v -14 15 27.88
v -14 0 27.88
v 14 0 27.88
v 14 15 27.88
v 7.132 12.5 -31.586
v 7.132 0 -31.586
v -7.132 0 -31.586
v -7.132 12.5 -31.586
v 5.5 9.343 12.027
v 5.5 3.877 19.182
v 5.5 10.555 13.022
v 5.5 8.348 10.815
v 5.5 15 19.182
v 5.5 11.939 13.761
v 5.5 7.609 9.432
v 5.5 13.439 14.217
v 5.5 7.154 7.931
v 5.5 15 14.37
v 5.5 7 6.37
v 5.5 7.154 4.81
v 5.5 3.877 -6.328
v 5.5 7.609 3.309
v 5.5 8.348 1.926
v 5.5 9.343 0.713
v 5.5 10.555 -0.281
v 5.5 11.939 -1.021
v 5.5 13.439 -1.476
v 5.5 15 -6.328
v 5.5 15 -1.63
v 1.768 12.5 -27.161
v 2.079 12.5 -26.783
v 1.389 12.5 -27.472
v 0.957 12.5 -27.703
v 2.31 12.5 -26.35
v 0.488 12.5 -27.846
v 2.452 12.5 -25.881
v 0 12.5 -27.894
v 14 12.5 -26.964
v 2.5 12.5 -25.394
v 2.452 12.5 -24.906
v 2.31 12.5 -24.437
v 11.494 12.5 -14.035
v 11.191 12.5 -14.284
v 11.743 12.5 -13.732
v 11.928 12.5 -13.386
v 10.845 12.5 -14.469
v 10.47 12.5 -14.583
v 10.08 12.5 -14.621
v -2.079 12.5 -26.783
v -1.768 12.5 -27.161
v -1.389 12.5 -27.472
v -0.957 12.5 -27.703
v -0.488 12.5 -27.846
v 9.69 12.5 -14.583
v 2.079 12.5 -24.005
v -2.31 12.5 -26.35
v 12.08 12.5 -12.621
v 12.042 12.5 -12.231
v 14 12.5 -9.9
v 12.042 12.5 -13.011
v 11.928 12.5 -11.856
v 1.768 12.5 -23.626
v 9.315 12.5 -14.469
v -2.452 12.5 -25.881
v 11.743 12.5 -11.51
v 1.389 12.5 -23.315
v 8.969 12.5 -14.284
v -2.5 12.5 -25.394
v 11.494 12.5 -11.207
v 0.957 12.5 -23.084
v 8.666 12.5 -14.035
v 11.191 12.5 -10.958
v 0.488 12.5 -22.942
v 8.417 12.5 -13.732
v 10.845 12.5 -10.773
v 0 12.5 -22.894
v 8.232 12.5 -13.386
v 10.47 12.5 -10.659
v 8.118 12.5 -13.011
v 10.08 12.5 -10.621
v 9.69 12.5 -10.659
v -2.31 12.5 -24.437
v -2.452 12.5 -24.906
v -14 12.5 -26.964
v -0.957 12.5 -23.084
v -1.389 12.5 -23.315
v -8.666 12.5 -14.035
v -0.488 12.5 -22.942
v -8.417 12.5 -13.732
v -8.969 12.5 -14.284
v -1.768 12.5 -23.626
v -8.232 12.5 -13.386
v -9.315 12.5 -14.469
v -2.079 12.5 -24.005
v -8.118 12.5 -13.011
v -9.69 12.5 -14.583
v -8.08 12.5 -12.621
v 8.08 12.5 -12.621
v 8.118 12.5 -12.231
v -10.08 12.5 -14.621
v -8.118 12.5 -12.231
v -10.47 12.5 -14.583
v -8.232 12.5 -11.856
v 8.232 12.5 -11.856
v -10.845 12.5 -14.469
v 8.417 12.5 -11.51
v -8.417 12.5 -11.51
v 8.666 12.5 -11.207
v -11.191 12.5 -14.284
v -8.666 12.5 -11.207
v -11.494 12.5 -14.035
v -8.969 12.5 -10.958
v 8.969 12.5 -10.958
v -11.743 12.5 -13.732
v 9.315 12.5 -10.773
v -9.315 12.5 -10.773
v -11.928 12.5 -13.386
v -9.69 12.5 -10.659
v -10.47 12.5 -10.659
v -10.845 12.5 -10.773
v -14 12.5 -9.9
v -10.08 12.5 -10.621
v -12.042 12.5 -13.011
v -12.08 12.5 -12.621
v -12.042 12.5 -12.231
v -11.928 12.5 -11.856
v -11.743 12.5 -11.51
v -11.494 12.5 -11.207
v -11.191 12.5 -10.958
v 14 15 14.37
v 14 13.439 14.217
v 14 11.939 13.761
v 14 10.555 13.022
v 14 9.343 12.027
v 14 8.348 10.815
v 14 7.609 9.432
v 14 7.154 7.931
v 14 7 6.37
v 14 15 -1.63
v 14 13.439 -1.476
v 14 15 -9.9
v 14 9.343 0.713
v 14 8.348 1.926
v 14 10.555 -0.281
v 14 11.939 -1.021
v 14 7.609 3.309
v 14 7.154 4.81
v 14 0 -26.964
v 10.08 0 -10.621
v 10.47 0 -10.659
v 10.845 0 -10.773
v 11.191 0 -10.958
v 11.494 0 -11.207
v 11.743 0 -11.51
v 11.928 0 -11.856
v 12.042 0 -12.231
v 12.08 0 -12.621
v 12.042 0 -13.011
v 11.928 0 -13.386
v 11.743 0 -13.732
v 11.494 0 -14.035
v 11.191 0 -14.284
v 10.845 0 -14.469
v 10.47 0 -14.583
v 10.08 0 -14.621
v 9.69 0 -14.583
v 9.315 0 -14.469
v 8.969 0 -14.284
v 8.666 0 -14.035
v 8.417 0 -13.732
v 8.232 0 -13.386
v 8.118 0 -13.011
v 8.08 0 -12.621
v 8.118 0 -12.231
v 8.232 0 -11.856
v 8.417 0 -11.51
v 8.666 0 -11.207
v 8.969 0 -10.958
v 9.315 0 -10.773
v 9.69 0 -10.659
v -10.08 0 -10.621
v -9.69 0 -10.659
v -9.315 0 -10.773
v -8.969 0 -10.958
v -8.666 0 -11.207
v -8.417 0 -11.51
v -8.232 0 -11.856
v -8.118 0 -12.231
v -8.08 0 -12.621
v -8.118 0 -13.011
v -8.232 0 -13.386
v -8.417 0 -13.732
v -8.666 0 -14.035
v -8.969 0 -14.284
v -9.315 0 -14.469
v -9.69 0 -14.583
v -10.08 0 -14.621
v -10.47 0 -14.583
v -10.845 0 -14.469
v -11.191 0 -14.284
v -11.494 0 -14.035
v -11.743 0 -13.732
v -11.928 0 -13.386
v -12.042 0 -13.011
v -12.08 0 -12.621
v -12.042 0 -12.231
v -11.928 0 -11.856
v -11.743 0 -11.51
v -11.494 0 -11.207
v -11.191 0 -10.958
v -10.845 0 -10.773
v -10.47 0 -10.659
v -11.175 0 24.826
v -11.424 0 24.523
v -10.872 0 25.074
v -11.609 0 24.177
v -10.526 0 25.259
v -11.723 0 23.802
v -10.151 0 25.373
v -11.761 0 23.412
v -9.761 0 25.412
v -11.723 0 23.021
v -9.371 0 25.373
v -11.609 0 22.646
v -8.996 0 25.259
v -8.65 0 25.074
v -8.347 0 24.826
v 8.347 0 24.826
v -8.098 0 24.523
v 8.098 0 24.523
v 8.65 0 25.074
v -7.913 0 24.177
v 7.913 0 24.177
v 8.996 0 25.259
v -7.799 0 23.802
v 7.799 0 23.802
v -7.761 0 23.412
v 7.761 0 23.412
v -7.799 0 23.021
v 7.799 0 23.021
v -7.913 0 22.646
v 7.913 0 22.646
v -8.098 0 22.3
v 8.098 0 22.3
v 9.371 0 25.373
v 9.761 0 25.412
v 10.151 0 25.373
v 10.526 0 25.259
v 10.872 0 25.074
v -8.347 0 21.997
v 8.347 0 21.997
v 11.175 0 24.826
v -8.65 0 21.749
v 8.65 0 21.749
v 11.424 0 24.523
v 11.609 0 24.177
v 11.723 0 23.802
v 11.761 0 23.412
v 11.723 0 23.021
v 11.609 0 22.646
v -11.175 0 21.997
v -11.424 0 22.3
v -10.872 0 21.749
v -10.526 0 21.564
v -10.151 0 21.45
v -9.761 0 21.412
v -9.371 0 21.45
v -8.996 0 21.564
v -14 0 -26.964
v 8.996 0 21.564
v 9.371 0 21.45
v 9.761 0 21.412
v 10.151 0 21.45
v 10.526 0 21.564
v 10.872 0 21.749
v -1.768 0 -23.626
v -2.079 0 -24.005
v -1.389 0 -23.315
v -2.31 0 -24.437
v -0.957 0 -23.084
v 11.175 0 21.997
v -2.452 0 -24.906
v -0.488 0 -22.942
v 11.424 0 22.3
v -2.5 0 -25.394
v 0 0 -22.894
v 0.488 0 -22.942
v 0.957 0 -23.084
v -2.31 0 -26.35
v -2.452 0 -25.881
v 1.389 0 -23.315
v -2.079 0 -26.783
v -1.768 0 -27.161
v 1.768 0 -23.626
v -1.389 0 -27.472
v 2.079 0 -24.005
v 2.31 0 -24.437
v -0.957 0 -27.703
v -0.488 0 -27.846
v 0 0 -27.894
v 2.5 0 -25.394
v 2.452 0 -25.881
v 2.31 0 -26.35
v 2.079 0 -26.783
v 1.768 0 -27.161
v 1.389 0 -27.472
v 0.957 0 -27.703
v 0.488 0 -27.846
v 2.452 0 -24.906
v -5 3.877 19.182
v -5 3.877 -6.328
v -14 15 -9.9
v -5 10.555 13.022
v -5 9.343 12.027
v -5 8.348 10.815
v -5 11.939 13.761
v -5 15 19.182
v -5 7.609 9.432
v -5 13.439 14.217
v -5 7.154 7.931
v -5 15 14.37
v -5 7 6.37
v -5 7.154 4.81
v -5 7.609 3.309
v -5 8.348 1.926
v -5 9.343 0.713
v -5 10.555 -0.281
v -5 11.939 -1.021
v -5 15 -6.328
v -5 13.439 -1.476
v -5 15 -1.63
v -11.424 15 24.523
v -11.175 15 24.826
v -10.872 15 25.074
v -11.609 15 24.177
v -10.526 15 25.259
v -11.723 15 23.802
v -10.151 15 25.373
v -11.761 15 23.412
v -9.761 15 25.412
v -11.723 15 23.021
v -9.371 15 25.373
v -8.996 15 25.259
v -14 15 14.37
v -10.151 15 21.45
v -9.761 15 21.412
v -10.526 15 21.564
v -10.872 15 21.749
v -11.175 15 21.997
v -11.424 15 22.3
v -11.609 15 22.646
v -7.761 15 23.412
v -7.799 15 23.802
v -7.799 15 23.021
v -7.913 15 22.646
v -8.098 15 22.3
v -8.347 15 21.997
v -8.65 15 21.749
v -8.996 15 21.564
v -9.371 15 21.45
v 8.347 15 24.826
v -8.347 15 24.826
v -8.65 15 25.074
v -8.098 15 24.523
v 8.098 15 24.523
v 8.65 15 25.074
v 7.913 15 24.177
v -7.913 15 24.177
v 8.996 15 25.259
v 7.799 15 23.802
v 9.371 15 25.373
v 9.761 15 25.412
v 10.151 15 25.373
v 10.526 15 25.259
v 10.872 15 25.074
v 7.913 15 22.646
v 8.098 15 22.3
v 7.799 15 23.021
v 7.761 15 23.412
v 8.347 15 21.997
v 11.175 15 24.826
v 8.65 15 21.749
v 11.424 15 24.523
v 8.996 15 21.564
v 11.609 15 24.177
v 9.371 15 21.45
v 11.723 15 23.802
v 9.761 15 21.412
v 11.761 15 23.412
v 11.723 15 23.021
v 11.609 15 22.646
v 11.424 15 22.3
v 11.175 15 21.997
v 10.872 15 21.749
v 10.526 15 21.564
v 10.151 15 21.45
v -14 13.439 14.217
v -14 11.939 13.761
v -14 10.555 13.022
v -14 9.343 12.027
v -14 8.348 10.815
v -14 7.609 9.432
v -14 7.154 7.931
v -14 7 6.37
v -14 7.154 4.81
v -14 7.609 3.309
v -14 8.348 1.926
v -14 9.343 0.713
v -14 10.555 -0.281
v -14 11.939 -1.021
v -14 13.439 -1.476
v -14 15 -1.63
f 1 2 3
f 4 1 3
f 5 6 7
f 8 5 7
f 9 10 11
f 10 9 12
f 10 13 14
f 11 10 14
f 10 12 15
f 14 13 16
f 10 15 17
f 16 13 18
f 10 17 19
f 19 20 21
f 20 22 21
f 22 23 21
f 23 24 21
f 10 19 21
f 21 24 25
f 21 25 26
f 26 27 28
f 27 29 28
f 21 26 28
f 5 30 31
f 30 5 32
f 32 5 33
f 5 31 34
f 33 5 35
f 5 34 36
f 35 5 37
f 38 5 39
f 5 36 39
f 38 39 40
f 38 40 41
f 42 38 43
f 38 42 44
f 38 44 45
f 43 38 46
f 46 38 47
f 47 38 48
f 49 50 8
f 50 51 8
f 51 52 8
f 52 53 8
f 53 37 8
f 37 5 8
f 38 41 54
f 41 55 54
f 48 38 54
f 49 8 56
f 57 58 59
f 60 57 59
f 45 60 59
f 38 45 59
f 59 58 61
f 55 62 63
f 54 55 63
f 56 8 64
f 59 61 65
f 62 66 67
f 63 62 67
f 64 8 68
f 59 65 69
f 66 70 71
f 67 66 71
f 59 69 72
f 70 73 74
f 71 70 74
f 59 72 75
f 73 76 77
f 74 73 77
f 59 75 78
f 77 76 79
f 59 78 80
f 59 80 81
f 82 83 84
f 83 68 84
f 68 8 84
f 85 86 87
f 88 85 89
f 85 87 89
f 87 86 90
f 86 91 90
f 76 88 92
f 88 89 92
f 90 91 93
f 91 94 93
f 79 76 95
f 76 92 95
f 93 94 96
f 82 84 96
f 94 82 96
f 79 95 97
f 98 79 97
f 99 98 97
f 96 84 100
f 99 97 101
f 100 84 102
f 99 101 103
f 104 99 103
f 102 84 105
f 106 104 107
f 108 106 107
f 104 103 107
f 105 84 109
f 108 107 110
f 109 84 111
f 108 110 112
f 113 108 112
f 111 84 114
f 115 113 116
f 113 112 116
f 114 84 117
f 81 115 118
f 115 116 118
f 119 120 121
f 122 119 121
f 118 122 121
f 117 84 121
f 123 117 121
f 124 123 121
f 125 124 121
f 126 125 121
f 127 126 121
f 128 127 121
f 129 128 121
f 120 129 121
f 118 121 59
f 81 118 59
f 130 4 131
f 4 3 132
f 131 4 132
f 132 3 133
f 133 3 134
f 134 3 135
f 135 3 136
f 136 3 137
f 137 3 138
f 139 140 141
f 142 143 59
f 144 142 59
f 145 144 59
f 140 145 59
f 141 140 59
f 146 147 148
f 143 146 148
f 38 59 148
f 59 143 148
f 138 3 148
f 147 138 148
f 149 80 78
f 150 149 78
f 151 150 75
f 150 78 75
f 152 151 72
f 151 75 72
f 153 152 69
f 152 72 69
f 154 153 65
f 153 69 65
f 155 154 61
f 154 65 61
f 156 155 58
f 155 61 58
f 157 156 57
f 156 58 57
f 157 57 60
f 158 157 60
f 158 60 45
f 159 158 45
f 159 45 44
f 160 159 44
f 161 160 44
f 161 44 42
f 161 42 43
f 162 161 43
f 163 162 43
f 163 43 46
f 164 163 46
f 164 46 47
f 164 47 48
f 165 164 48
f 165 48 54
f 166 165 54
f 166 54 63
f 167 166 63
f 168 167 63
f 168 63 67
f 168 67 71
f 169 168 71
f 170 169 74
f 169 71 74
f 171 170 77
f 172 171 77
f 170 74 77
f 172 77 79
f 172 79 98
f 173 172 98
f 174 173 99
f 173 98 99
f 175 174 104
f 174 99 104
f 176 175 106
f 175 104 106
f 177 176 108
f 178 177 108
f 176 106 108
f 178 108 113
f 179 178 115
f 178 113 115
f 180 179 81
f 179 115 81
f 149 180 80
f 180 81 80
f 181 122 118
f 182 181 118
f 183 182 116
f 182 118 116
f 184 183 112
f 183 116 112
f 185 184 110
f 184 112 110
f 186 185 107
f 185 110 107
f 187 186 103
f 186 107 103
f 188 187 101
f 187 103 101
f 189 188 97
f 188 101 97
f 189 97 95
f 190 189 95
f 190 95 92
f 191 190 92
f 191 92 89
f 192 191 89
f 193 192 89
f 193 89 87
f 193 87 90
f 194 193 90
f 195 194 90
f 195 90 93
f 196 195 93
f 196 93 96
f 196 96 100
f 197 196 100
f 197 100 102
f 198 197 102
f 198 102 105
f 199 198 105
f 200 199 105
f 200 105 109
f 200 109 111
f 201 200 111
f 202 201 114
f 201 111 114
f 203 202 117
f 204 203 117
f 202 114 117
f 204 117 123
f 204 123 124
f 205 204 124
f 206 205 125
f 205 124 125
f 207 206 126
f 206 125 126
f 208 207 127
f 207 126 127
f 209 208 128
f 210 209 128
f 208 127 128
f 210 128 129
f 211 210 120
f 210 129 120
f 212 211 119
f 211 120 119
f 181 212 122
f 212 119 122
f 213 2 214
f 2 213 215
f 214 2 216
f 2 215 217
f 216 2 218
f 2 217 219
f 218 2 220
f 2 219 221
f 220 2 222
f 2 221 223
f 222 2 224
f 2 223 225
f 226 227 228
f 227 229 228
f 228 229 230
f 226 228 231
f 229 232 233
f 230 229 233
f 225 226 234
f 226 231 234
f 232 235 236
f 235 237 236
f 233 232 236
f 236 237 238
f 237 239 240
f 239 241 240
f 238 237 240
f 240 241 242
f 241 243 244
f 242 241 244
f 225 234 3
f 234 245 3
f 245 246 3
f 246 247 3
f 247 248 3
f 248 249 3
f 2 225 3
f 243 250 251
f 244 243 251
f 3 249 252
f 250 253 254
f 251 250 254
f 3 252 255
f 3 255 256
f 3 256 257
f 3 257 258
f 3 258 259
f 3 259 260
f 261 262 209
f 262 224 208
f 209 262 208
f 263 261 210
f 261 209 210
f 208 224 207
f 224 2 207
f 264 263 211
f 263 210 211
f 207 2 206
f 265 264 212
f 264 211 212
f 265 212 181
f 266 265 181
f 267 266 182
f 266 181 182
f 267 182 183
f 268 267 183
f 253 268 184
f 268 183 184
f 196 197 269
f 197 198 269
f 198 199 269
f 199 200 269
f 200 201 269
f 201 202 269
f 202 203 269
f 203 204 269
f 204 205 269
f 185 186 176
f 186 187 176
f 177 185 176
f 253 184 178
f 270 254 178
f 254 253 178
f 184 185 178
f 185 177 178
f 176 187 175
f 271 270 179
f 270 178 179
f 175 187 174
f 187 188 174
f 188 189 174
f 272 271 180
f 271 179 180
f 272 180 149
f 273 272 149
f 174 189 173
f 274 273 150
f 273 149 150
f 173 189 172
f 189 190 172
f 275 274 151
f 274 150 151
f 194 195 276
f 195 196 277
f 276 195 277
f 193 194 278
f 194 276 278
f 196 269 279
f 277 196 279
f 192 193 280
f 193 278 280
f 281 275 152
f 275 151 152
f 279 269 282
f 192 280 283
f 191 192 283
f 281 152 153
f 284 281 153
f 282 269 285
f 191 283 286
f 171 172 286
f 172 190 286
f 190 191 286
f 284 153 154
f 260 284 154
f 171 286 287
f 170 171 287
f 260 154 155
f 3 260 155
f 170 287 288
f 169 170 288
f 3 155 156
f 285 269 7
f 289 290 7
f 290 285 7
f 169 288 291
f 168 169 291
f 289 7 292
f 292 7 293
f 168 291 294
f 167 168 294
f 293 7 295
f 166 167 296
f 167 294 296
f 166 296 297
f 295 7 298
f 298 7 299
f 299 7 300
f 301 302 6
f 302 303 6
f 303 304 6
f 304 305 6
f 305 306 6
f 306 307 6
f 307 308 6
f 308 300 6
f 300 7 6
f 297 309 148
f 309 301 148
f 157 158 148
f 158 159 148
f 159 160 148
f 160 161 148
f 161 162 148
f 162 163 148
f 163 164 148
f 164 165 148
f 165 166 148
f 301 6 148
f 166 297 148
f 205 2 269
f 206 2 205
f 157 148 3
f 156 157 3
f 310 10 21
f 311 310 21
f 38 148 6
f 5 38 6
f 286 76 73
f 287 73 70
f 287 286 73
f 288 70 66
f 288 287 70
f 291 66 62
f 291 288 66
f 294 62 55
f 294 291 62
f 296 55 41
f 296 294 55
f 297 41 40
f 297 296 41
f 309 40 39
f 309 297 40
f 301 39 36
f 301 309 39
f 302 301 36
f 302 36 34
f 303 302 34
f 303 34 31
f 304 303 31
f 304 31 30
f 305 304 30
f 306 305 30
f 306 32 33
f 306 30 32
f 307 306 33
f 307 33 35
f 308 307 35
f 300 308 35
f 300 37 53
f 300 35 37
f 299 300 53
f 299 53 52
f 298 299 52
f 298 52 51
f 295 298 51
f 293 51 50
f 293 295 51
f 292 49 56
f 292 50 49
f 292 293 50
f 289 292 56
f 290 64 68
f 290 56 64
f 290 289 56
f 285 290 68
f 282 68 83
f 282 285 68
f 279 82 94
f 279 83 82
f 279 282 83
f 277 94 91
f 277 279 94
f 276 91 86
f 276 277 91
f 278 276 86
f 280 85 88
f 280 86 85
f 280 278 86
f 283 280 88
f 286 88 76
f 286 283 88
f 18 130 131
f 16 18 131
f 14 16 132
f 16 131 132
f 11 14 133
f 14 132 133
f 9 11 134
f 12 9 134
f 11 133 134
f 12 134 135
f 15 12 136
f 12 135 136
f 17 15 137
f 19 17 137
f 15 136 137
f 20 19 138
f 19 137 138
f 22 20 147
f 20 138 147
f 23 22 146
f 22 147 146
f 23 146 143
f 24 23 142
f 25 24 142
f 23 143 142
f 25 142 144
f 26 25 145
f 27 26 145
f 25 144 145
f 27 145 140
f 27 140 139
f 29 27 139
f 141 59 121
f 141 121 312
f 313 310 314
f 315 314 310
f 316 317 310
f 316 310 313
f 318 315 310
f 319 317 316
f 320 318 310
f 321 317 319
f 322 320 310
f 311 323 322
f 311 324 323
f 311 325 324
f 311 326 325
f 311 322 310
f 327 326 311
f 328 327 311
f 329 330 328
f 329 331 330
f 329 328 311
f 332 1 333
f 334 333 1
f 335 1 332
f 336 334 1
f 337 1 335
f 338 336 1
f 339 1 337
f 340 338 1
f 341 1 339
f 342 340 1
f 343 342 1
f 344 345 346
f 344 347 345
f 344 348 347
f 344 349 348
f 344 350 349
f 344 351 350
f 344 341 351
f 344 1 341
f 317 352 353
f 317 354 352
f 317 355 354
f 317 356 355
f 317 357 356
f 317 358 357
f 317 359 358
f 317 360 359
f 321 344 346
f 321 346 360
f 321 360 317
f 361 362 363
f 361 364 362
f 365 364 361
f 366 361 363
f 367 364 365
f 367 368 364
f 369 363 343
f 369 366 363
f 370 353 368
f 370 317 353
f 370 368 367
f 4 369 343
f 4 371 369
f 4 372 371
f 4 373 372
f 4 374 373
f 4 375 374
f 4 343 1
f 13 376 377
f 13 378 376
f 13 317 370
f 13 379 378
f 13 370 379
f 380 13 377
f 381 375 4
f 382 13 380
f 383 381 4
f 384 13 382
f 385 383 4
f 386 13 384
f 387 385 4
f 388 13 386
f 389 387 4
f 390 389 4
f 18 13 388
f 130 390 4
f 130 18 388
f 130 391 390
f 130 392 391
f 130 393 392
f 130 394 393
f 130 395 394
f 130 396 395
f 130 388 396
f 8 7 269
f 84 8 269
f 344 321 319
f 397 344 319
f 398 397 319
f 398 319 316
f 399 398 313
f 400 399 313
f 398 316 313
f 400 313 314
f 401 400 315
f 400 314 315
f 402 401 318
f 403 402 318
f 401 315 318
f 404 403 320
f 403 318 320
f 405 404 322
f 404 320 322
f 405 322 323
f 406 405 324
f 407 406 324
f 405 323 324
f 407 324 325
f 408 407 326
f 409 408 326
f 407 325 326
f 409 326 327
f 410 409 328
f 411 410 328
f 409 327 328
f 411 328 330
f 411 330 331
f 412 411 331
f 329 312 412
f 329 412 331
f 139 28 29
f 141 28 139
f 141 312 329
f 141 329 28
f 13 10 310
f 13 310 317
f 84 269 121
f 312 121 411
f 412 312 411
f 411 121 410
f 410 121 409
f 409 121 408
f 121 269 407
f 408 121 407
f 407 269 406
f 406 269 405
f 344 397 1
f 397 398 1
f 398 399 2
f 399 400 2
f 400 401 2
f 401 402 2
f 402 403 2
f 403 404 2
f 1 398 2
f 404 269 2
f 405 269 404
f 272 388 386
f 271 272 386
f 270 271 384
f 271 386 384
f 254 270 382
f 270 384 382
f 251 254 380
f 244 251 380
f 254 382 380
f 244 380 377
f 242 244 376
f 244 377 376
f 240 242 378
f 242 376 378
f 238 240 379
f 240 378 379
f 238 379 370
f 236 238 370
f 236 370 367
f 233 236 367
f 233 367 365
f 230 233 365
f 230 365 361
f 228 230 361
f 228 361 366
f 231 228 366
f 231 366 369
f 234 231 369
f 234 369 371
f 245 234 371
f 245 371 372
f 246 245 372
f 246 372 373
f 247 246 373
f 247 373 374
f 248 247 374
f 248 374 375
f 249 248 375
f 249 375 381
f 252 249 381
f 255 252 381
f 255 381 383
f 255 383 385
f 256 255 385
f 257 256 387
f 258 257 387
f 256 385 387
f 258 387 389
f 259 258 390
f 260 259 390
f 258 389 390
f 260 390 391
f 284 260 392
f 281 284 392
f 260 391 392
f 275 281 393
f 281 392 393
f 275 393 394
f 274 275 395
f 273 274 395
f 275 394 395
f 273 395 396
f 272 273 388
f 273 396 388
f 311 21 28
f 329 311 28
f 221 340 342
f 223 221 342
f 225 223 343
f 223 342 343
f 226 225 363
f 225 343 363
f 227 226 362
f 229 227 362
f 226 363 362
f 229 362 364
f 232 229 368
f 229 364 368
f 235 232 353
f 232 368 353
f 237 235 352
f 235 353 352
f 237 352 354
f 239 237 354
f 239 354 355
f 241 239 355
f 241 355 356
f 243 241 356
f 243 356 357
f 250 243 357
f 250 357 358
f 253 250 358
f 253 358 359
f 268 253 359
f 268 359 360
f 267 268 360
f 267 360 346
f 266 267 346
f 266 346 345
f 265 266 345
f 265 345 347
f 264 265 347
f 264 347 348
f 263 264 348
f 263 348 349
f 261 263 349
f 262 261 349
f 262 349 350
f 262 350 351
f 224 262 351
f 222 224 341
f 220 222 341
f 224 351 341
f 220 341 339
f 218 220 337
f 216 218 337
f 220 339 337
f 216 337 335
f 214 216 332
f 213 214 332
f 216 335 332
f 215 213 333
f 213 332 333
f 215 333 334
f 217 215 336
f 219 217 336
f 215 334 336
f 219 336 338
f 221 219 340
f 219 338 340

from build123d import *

# Parameters (mm, degrees)
SKETCH_1_R            = 2.5
EXTRUDE_1_DEPTH       = 15
CUT_EXTRUDE_START     = -8.5
SKETCH_4_W            = 25.510318362
SKETCH_4_H            = 11.123148158
CUT_EXTRUDE_1_DEPTH   = 10.5
SKETCH_5_R            = 8
CUT_EXTRUDE_2_DEPTH   = 45.795847434
SKETCH_6_R            = 2
CUT_EXTRUDE_3_DEPTH   = 38.665208712
SKETCH_7_W            = 21.685962805
SKETCH_7_H            = 6.466354348
CUT_EXTRUDE_2_2_DEPTH = 45.795847434
SKETCH_8_R            = 2
CUT_EXTRUDE_4_DEPTH   = 37.741229529


with BuildPart() as part:
    # Эскиз1 → Вытянуть1 (new body)
    with BuildSketch(Plane(origin=(0, 0, 0), x_dir=(1, 0, 0), z_dir=(0, 1, 0))):
        Polygon((14, 26.964204166), (7.131727139, 31.585882089), (-7.131727139, 31.585882089), (-14, 26.964204166), (-14, -27.88029884), (14, -27.88029884), align=None)
        with Locations(Location((0, 25.393583102, 0), (0, 0, 270))):
            Circle(SKETCH_1_R, mode=Mode.SUBTRACT)
    extrude(amount=EXTRUDE_1_DEPTH)

    # Эскиз4 → Вырез-Вытянуть1 (cut)
    with BuildSketch(Plane(origin=(14, 0, 0), x_dir=(0, 0, -1), z_dir=(1, 0, 0)).offset(CUT_EXTRUDE_START)):
        with Locations((-6.426786787, 9.438425921)):
            Rectangle(SKETCH_4_W, SKETCH_4_H)
    extrude(amount=-CUT_EXTRUDE_1_DEPTH, mode=Mode.SUBTRACT)

    # Эскиз5 → Cut-Extrude 2 (cut, through all)
    with BuildSketch(Plane(origin=(14, 0, 0), x_dir=(0, 0, -1), z_dir=(1, 0, 0))):
        with Locations((-6.37029618, 15)):
            Circle(SKETCH_5_R)
    extrude(amount=-CUT_EXTRUDE_2_DEPTH, mode=Mode.SUBTRACT)

    # Эскиз6 → Вытянуть3 (cut, through all)
    with BuildSketch(Plane(origin=(0, 15, 0), x_dir=(1, 0, 0), z_dir=(0, 1, 0))):
        with Locations(Location((-9.761047482, -23.411554498, 0), (0, 0, 270))):
            Circle(SKETCH_6_R)
        with Locations(Location((9.761047482, -23.411554498, 0), (0, 0, 90))):
            Circle(SKETCH_6_R)
    extrude(amount=-CUT_EXTRUDE_3_DEPTH, mode=Mode.SUBTRACT)

    # Эскиз7 → Cut-Extrude 2 2 (cut, through all)
    with BuildSketch(Plane.ZY.offset(14)):
        with Locations((-20.742900687, 15.733177174)):
            Rectangle(SKETCH_7_W, SKETCH_7_H)
    extrude(amount=-CUT_EXTRUDE_2_2_DEPTH, mode=Mode.SUBTRACT)

    # Эскиз8 → Вытянуть4 (cut, through all)
    with BuildSketch(Plane(origin=(0, 12.5, 0), x_dir=(1, 0, 0), z_dir=(0, 1, 0))):
        with Locations(Location((-10.080038917, 12.621065786, 0), (0, 0, 270))):
            Circle(SKETCH_8_R)
        with Locations(Location((10.080038917, 12.621065786, 0), (0, 0, 270))):
            Circle(SKETCH_8_R)
    extrude(amount=-CUT_EXTRUDE_4_DEPTH, mode=Mode.SUBTRACT)


solid = part.part
